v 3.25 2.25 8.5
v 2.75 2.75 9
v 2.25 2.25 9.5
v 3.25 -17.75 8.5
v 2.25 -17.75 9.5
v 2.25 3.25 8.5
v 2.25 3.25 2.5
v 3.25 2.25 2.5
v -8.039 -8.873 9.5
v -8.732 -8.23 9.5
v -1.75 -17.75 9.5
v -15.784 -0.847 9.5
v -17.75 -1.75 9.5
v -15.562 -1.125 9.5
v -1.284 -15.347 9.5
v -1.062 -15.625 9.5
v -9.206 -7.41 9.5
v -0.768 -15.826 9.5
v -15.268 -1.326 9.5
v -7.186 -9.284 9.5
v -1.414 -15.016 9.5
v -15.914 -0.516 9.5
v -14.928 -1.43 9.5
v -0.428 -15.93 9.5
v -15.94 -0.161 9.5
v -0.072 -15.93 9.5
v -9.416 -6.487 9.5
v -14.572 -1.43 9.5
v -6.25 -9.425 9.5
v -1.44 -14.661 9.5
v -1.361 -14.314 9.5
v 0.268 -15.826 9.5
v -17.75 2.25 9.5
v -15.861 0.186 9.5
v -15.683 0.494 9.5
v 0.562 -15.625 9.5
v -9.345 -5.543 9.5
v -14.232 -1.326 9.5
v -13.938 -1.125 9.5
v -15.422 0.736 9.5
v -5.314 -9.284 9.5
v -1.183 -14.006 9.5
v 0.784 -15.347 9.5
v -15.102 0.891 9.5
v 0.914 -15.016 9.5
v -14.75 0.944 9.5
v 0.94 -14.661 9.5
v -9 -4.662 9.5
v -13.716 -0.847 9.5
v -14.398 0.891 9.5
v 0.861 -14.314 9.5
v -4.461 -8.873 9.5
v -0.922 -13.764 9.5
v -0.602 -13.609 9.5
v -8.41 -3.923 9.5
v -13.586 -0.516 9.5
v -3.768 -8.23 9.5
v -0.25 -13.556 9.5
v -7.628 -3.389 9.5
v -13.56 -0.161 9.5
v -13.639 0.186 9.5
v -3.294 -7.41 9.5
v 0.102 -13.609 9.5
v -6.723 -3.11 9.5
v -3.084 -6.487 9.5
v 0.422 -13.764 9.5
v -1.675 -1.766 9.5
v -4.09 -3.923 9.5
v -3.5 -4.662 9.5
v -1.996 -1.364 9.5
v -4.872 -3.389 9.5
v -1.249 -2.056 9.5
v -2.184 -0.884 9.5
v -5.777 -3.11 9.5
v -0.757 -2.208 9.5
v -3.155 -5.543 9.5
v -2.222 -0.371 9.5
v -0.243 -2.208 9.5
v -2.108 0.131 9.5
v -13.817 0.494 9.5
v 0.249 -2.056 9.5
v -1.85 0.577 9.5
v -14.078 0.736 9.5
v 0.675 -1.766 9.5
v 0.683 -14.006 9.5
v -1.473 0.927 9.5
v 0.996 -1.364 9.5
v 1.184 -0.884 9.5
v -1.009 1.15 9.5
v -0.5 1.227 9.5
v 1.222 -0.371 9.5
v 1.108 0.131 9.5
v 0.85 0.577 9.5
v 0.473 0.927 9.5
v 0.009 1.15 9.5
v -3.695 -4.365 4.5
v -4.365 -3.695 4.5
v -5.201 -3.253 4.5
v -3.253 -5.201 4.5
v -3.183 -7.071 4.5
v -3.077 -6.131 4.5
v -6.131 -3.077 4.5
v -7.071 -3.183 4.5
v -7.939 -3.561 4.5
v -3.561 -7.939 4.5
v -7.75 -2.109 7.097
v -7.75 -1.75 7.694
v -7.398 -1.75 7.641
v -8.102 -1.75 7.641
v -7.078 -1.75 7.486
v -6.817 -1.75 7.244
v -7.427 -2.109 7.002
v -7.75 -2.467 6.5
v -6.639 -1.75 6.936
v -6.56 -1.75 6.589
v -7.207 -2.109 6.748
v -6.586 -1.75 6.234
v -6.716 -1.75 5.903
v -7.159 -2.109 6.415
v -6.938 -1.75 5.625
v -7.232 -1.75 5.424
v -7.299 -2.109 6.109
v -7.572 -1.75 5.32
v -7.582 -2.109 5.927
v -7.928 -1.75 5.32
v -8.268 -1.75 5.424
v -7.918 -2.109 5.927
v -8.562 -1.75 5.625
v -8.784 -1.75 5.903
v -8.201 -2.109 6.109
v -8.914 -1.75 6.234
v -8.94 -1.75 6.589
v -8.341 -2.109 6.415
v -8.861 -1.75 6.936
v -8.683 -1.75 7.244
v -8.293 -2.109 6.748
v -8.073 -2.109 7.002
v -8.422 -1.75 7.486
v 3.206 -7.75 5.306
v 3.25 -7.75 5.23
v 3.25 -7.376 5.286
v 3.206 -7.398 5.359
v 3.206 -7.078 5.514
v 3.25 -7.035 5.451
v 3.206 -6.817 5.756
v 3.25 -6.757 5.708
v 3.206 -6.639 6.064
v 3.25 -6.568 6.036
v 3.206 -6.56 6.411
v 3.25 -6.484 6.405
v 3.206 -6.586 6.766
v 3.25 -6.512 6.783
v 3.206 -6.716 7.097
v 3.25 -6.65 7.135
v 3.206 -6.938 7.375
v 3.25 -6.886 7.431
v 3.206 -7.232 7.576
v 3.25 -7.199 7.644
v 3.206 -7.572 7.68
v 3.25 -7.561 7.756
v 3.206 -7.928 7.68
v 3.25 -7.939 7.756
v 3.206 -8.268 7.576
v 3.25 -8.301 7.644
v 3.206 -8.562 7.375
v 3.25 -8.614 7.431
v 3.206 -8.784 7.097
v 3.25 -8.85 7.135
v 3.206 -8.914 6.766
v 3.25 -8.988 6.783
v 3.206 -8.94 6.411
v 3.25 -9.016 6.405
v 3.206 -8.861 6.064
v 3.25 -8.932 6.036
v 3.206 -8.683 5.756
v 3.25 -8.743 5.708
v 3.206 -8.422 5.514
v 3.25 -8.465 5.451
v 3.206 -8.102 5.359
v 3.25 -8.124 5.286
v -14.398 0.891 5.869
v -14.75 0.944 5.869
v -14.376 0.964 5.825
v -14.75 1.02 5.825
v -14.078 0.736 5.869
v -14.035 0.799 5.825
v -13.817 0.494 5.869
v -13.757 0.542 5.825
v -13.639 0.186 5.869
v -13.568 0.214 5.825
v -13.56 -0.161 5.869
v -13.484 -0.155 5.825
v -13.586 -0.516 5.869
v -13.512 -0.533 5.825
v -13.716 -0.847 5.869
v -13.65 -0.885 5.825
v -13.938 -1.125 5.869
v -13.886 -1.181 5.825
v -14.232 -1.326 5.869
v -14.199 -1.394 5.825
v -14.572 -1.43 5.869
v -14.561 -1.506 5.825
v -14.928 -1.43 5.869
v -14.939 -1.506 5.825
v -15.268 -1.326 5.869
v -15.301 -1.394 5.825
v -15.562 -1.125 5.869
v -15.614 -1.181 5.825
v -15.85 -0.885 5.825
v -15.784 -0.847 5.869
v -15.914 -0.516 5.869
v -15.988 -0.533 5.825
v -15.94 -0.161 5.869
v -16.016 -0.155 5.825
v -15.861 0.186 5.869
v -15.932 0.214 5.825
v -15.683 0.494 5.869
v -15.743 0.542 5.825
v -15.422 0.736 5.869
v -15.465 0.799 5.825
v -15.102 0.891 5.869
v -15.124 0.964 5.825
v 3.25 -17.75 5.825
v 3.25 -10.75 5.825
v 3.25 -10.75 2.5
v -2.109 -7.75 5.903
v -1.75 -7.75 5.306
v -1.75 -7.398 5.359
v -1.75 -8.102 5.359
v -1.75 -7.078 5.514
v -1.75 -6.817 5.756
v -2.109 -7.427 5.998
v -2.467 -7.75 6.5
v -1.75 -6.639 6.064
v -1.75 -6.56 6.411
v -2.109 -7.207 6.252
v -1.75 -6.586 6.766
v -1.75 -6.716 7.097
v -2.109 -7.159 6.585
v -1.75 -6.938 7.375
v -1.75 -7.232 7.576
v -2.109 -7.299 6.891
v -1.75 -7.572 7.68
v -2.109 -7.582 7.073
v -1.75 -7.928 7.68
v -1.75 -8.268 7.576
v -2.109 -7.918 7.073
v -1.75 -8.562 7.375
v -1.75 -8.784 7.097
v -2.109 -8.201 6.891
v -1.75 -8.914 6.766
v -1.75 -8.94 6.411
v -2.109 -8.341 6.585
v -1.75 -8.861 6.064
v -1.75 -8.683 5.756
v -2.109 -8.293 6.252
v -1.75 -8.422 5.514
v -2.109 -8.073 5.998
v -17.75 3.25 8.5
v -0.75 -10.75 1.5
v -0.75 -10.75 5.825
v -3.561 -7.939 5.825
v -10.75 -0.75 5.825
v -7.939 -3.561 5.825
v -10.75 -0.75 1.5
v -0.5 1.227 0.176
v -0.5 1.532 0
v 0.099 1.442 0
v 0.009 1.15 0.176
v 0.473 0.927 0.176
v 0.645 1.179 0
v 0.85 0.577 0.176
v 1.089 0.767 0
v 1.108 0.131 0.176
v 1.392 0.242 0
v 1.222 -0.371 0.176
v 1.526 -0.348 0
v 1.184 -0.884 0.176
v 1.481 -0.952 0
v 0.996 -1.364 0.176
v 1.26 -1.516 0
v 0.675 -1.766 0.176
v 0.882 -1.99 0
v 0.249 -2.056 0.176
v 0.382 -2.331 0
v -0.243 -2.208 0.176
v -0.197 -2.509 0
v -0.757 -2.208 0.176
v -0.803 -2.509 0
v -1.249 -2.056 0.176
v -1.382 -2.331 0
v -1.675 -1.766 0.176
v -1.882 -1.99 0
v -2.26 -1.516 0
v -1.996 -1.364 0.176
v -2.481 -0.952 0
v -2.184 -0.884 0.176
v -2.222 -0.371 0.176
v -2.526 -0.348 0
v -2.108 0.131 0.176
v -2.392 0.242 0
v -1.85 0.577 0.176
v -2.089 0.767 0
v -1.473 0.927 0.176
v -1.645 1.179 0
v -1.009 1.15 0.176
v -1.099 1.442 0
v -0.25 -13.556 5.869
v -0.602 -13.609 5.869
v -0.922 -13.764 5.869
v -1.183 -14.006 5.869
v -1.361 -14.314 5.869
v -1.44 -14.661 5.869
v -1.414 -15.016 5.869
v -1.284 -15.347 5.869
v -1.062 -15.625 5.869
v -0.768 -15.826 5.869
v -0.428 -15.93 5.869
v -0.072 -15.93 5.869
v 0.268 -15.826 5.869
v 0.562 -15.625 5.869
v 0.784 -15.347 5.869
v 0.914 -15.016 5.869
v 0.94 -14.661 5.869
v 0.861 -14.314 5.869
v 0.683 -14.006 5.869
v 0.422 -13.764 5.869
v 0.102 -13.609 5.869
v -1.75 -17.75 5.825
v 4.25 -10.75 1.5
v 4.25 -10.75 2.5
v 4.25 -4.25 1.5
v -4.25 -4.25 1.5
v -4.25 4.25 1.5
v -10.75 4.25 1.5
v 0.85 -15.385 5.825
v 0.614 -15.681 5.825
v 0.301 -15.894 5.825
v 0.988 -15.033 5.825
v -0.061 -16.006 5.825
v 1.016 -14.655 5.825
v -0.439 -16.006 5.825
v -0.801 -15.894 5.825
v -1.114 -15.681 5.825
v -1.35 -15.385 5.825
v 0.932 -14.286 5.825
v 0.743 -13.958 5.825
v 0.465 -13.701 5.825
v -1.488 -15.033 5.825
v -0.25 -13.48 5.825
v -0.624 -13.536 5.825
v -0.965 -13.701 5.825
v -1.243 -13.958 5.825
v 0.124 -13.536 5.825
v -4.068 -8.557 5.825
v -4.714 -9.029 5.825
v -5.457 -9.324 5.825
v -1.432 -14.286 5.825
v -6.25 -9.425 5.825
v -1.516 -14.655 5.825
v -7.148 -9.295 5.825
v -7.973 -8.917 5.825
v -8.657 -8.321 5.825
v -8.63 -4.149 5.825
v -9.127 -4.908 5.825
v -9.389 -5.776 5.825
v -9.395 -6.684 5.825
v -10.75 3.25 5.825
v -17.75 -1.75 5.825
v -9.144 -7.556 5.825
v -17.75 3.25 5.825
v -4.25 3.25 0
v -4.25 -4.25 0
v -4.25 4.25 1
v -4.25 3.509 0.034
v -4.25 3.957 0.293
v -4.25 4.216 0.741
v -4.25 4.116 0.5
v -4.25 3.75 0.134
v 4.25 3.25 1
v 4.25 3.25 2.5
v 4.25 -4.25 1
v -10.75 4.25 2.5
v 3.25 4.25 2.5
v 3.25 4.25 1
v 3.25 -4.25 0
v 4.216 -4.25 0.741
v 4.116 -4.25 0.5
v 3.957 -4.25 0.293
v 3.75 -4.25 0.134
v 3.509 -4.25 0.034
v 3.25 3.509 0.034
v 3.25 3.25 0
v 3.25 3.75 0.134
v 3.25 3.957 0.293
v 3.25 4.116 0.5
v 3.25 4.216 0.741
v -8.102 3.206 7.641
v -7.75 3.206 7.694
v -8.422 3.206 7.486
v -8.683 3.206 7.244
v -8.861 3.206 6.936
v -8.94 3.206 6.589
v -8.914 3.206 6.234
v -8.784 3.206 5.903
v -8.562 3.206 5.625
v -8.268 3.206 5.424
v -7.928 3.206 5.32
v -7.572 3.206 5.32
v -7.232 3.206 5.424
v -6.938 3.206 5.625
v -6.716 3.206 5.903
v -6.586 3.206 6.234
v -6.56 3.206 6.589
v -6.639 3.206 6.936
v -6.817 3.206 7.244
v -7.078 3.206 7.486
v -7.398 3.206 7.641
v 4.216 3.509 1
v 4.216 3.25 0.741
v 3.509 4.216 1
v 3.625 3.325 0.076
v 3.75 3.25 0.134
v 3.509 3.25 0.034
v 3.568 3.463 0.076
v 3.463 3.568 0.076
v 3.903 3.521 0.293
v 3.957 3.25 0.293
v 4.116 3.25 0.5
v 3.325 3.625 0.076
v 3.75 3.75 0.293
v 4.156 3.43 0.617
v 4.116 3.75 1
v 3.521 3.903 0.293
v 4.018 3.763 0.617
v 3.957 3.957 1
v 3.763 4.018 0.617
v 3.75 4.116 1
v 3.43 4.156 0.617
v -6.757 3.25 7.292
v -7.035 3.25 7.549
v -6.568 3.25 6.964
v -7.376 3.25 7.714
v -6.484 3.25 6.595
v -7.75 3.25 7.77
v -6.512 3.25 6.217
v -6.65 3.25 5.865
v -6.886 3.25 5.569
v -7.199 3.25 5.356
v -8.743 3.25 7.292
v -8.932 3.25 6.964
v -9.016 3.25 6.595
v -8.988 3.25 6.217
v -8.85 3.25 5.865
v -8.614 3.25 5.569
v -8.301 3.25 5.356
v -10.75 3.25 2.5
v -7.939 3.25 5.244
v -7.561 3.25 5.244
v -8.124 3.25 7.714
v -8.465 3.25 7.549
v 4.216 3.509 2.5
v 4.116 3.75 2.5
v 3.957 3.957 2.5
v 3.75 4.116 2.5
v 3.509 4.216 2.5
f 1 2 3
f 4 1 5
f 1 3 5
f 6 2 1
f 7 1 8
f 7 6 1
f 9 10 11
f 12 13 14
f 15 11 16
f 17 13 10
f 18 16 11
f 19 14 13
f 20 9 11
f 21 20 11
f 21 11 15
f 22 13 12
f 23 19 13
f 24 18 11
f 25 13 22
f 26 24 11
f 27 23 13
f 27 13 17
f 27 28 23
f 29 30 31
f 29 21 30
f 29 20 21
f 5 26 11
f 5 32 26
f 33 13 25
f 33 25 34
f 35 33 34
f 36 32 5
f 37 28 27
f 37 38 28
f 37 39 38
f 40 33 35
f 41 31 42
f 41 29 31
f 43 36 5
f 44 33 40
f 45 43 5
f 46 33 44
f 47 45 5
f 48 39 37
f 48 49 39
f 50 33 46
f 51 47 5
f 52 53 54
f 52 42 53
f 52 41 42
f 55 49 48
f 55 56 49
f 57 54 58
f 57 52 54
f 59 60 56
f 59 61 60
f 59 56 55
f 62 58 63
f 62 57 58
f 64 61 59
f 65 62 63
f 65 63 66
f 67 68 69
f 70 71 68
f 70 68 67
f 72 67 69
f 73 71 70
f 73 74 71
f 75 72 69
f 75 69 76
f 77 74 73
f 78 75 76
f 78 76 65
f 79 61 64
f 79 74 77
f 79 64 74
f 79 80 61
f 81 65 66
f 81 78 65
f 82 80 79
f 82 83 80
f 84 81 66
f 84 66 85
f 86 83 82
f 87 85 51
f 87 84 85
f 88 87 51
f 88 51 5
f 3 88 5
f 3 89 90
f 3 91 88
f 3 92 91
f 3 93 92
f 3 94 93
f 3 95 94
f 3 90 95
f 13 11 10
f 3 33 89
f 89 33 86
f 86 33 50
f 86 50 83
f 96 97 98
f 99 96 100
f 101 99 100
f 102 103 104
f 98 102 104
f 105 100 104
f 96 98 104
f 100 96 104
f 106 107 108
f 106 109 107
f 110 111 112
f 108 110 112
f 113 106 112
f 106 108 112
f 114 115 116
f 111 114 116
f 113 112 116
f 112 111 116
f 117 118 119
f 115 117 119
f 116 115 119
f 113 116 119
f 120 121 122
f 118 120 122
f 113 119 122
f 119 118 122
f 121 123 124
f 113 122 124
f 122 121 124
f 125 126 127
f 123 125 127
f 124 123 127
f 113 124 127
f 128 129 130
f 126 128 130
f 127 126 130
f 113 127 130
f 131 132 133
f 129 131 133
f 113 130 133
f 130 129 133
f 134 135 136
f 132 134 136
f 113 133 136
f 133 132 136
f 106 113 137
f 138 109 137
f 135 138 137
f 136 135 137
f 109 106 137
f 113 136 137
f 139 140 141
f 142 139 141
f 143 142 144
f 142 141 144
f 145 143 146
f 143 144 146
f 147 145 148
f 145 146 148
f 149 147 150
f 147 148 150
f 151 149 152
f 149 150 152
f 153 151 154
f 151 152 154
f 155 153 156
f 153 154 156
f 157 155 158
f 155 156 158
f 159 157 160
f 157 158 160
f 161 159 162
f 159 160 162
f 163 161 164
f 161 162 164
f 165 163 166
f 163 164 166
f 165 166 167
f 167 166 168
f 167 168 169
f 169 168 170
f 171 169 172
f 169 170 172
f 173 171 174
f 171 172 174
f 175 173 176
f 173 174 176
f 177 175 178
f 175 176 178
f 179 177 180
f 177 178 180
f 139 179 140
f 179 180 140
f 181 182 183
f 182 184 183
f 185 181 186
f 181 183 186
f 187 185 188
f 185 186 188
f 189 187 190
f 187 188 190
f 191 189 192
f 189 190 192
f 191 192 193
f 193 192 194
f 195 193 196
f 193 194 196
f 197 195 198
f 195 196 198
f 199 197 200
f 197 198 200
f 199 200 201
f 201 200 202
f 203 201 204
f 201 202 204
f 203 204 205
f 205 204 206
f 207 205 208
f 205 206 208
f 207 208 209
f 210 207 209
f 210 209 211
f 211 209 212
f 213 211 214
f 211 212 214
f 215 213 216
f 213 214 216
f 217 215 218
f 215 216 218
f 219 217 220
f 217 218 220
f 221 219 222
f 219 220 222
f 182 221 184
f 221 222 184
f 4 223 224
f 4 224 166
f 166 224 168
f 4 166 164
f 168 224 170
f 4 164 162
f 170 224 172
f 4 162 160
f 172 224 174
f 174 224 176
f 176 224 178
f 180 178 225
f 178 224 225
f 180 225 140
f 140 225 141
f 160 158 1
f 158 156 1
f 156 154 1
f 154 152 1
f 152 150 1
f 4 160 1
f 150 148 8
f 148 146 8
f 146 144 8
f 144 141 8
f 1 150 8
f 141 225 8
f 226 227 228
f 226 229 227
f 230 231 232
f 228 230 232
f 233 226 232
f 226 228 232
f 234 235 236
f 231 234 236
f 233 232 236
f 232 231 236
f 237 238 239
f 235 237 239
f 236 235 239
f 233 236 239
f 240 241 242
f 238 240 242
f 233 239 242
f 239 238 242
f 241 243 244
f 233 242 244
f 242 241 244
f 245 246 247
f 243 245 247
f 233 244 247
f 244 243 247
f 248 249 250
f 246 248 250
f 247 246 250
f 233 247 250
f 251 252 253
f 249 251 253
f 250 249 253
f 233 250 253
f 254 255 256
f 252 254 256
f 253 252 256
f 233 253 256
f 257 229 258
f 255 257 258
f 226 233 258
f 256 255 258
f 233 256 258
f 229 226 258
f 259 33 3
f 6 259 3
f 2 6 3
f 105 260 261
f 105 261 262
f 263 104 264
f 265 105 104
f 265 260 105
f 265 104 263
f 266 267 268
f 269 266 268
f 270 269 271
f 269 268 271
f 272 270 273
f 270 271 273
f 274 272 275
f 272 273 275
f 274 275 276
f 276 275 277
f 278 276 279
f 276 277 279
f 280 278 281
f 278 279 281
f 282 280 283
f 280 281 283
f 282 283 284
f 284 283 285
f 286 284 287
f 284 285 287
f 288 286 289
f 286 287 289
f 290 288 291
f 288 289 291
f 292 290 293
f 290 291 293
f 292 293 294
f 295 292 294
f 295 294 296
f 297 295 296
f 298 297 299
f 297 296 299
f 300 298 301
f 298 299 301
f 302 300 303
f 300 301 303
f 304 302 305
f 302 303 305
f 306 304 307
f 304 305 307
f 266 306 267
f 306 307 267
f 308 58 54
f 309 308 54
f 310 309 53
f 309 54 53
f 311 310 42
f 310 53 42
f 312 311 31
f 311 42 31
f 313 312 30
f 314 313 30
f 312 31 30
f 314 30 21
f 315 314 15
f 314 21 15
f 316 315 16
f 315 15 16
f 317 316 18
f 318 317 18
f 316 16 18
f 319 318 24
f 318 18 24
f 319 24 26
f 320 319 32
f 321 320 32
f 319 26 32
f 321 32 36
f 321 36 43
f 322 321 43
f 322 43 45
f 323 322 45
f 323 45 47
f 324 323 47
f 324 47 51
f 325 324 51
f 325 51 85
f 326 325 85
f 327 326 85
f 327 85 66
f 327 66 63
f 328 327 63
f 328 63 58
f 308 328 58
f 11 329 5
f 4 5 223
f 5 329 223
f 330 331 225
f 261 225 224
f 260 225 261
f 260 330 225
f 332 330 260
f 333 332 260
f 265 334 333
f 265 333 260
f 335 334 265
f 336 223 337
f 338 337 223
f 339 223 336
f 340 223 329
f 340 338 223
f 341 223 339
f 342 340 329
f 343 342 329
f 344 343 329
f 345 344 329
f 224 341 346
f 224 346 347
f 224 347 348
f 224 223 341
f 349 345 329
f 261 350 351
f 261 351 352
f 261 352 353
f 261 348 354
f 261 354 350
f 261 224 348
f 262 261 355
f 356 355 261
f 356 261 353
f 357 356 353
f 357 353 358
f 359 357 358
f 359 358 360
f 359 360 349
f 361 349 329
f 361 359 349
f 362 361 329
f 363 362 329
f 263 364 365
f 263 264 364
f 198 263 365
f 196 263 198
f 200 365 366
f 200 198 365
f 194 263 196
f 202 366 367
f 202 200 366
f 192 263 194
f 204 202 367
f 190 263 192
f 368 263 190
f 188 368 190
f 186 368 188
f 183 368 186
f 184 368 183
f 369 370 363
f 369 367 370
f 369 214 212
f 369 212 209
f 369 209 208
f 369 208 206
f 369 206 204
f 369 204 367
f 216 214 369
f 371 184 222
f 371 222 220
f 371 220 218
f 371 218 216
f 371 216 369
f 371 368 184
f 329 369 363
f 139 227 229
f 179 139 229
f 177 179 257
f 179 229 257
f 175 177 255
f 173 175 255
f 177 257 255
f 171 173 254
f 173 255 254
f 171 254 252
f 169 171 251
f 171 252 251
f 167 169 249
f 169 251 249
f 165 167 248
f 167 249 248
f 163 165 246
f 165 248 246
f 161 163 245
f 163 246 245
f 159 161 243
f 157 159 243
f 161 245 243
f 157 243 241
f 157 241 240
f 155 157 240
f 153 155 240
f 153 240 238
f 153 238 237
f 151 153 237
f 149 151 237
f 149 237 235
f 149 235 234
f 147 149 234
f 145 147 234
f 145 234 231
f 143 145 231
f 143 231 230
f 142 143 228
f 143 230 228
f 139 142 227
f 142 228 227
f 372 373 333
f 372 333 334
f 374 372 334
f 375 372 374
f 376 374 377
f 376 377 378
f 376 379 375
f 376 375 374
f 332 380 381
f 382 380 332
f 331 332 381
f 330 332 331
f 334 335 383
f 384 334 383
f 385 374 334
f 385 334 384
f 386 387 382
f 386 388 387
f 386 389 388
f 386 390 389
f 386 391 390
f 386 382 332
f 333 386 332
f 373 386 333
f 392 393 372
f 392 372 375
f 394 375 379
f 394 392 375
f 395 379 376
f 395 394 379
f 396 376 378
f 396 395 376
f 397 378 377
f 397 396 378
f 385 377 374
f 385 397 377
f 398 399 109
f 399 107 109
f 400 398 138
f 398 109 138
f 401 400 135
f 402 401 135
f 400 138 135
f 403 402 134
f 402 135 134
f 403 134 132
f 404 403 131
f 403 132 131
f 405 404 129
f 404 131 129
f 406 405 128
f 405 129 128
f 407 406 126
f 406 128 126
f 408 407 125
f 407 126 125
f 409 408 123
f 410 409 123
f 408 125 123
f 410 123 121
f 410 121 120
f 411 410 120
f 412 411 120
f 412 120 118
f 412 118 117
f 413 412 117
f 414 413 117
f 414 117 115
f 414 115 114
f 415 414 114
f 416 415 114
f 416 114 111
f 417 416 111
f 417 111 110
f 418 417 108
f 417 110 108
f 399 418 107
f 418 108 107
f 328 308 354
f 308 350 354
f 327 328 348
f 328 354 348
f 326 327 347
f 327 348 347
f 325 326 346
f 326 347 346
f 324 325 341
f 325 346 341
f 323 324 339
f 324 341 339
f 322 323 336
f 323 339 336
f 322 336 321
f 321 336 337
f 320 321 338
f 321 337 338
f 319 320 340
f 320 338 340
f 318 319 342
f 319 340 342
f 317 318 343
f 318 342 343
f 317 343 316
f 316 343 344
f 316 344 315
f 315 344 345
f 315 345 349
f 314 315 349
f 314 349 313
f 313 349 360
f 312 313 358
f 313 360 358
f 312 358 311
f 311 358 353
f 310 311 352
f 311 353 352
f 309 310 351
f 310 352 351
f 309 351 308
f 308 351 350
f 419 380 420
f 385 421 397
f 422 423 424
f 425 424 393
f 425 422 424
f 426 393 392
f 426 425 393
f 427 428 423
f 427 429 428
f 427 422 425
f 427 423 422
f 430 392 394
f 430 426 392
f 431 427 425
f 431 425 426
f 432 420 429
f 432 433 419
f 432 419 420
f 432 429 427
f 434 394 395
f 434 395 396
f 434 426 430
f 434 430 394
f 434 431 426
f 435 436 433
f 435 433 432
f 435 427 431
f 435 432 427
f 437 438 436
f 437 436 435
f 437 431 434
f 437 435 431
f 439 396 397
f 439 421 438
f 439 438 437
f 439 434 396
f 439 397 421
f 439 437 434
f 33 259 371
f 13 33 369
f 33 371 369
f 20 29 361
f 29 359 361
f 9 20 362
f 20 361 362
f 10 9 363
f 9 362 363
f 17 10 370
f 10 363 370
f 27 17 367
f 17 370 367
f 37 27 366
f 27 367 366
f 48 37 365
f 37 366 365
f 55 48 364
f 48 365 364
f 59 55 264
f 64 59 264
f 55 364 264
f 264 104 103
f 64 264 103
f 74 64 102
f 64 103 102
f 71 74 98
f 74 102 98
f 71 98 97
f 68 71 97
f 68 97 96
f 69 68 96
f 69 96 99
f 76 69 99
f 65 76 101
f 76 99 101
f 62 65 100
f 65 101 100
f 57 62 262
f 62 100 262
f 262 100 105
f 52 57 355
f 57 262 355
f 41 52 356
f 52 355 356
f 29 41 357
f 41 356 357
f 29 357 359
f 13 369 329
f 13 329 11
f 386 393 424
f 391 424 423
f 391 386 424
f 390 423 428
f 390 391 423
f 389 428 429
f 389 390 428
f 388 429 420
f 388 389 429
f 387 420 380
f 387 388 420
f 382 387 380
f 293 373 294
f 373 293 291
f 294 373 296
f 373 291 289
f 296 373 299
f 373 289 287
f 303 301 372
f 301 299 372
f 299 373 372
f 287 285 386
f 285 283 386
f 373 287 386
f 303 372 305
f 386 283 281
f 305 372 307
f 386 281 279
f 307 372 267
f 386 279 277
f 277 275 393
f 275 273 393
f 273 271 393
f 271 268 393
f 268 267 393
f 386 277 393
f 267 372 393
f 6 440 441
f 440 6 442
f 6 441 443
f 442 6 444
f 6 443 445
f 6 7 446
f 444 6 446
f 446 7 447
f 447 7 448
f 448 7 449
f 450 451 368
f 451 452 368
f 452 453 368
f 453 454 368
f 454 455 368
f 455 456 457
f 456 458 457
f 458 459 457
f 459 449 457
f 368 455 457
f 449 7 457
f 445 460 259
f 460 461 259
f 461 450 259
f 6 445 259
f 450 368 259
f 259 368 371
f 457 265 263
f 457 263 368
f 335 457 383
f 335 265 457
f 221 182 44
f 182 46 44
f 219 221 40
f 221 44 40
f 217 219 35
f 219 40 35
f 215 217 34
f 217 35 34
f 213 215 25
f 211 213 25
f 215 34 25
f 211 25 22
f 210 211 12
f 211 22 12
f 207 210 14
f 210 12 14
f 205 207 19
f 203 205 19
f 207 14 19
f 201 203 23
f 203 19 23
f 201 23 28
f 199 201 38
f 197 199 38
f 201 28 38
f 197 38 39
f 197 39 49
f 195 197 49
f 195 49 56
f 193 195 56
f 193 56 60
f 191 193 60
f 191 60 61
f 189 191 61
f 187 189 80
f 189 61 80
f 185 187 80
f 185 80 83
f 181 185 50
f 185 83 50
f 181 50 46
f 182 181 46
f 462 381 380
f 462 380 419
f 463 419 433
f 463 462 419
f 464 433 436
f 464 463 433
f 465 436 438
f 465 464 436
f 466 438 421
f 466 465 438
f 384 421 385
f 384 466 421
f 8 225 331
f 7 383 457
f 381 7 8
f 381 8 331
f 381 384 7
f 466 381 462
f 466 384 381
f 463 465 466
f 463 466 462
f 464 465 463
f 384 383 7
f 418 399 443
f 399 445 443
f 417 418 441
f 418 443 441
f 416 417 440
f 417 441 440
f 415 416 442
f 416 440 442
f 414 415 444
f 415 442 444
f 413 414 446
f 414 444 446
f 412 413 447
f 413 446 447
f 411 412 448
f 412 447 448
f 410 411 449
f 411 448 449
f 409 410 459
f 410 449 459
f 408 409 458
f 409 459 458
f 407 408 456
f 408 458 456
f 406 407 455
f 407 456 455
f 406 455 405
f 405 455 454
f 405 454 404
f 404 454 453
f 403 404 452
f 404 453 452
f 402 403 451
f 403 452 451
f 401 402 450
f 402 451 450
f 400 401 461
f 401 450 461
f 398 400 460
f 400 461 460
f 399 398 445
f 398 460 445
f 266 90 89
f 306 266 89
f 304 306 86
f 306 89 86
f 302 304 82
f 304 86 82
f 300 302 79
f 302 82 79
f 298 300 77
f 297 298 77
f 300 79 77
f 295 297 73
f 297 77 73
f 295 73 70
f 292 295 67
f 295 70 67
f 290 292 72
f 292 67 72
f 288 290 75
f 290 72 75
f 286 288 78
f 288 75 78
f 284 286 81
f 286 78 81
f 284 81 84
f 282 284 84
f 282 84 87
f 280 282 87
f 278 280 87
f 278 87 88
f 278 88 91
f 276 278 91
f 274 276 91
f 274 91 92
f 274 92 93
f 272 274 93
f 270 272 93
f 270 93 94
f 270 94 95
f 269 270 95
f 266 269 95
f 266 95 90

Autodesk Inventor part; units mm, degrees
ref_plane "YZ Plane" through (0, 0, 0) normal (1, 0, 0) x (0, 1, 0)
ref_plane "XZ Plane" through (0, 0, 0) normal (0, 1, 0) x (-1, 0, 0)
ref_plane "XY Plane" through (0, 0, 0) normal (0, 0, 1) x (1, 0, 0)
sketch "Sketch1" plane through (0, 0, 0) normal (0, 0, 1) x (1, 0, 0)
  line L0 (-4.25, 4.25) -> (4.25, 4.25)
  line L1 (4.25, 4.25) -> (4.25, -4.25)
  line L2 (4.25, -4.25) -> (-4.25, -4.25)
  line L3 (-4.25, -4.25) -> (-4.25, 4.25)
  point P0 (0, 0)
  dimension "d0" = 8.5
  dimension "d1" = 8.5
  dimension "d2" = 4.25
  dimension "d3" = 4.25
extrude "Extrusion1" add sketch "Sketch1" along normal blind 2.5
fillet "Fillet2" radius 1 3 edges at (4.25, 4.25, 1.25) (4.25, 0, 0) (0, 4.25, 0)
sketch "Sketch10" plane through (0, 0, 2.5) normal (0, 0, 1) x (1, 0, 0)
  line L0 (4.25, 3.25) -> (4.25, -4.25) projected
  line L1 (-4.25, 4.25) -> (3.25, 4.25) projected
  line L2 (3.25, 3.25) -> (-17.75, 3.25)
  line L3 (-17.75, 3.25) -> (-17.75, -17.75)
  line L4 (-17.75, -17.75) -> (3.25, -17.75)
  line L5 (3.25, -17.75) -> (3.25, 3.25)
  point P0 (0, 0)
  dimension "d113" = 1
  dimension "d114" = 1
  dimension "d115" = 21
  dimension "d116" = 21
extrude "Extrusion8" add sketch "Sketch10" along normal blind 7
hole "Hole9" at (3.25, -7.75, 6.5) direction (-1, 0, 0) diameter 2.3876 depth 5 tip angle 118 countersink diameter 2.54 countersink angle 120
hole "Hole10" at (-7.75, 3.25, 6.5) direction (0, -1, 0) diameter 2.3876 depth 5 tip angle 118 countersink diameter 2.54 countersink angle 120
hole "Hole11" at (-6.25, -6.25, 9.5) direction (0, 0, -1) diameter 6.35 depth 5
sketch "Sketch11" plane through (0, 0, 2.5) normal (0, 0, -1) x (-1, 0, 0)
  line L0 (17.75, -17.75) -> (-3.25, -17.75) projected
  line L1 (17.75, 3.25) -> (17.75, -17.75) projected
  line L2 (4.25, 3.25) -> (17.75, 3.25) projected
  line L3 (10.75, 3.25) -> (17.75, 3.25)
  line L4 (17.75, 3.25) -> (17.75, -17.75)
  line L5 (17.75, -17.75) -> (-3.25, -17.75)
  line L6 (-3.25, -17.75) -> (-3.25, -10.75)
  line L7 (-3.25, -10.75) -> (0.75, -10.75)
  line L8 (0.75, -10.75) -> (10.75, -0.75)
  line L9 (10.75, -0.75) -> (10.75, 3.25)
  point P0 (0, 0)
  dimension "d146" = 14
  dimension "d158" = 4
extrude "Extrusion9" cut sketch "Sketch11" against normal blind 3.325
hole "Hole12" at (-0.25, -14.75, 5.825) direction (0, 0, 1) diameter 2.3876 end through all countersink diameter 2.54 countersink angle 120
hole "Hole13" at (-14.75, -0.25, 5.825) direction (0, 0, 1) diameter 2.3876 end through all countersink diameter 2.54 countersink angle 120
chamfer "Chamfer3" distance 16 angle 45 1 edges at (-17.75, -17.75, 7.6625)
chamfer "Chamfer4" distance 1 angle 45 2 edges at (-7.25, 3.25, 9.5) (3.25, -7.25, 9.5)
sketch "Sketch15" plane through (0, 0, 2.5) normal (0, 0, 1) x (1, 0, 0)
  line L0 (-4.25, 3.25) -> (3.25, 3.25) projected
  line L1 (3.25, 3.25) -> (3.25, -4.25) projected
  line L2 (4.25, -4.25) -> (3.25, -4.25) projected
  line L3 (4.25, 3.25) -> (4.25, -4.25) projected
  arc A0 (4.25, 3.25) -> (3.25, 4.25) centre (3.25, 3.25) ccw projected
  line L4 (-4.25, 4.25) -> (3.25, 4.25) projected
  line L5 (-4.25, 3.25) -> (-4.25, 4.25) projected
  point P0 (0, 0)
extrude "Extrusion11" [suppressed]
chamfer "Chamfer6" distance 1 angle 45 1 edges at (3.25, 3.25, 5.5)
hole "Hole16" at (-0.5, -0.5, 0) direction (0, 0, 1) diameter 3.4544 end through all countersink diameter 4.064 countersink angle 120
sketch "Sketch16" plane through (0, 0, 2.5) normal (0, 0, -1) x (-1, 0, 0)
  line L0 (-3.25, -10.75) -> (0.75, -10.75) projected
  line L1 (10.75, -0.75) -> (10.75, 3.25) projected
  line L2 (4.25, 3.25) -> (10.75, 3.25) projected
  line L3 (4.25, -4.25) -> (4.25, 3.25) projected
  line L4 (-3.25, -4.25) -> (4.25, -4.25) projected
  line L5 (-3.25, -10.75) -> (-3.25, -4.25) projected
  line L6 (4.25, 4.25) -> (10.75, 4.25)
  line L7 (10.75, 4.25) -> (10.75, -0.75)
  line L8 (10.75, -0.75) -> (0.75, -10.75)
  line L9 (0.75, -10.75) -> (-4.25, -10.75)
  line L10 (-4.25, -10.75) -> (-4.25, -4.25)
  line L11 (-4.25, -4.25) -> (4.25, -4.25)
  line L12 (4.25, -4.25) -> (4.25, 4.25)
  point P0 (0, 0)
  dimension "d213" = 1
  dimension "d214" = 1
extrude "Extrusion12" add sketch "Sketch16" along normal blind 1
properties part number "FOX-ME-121-03" material "Aluminum-6061"
